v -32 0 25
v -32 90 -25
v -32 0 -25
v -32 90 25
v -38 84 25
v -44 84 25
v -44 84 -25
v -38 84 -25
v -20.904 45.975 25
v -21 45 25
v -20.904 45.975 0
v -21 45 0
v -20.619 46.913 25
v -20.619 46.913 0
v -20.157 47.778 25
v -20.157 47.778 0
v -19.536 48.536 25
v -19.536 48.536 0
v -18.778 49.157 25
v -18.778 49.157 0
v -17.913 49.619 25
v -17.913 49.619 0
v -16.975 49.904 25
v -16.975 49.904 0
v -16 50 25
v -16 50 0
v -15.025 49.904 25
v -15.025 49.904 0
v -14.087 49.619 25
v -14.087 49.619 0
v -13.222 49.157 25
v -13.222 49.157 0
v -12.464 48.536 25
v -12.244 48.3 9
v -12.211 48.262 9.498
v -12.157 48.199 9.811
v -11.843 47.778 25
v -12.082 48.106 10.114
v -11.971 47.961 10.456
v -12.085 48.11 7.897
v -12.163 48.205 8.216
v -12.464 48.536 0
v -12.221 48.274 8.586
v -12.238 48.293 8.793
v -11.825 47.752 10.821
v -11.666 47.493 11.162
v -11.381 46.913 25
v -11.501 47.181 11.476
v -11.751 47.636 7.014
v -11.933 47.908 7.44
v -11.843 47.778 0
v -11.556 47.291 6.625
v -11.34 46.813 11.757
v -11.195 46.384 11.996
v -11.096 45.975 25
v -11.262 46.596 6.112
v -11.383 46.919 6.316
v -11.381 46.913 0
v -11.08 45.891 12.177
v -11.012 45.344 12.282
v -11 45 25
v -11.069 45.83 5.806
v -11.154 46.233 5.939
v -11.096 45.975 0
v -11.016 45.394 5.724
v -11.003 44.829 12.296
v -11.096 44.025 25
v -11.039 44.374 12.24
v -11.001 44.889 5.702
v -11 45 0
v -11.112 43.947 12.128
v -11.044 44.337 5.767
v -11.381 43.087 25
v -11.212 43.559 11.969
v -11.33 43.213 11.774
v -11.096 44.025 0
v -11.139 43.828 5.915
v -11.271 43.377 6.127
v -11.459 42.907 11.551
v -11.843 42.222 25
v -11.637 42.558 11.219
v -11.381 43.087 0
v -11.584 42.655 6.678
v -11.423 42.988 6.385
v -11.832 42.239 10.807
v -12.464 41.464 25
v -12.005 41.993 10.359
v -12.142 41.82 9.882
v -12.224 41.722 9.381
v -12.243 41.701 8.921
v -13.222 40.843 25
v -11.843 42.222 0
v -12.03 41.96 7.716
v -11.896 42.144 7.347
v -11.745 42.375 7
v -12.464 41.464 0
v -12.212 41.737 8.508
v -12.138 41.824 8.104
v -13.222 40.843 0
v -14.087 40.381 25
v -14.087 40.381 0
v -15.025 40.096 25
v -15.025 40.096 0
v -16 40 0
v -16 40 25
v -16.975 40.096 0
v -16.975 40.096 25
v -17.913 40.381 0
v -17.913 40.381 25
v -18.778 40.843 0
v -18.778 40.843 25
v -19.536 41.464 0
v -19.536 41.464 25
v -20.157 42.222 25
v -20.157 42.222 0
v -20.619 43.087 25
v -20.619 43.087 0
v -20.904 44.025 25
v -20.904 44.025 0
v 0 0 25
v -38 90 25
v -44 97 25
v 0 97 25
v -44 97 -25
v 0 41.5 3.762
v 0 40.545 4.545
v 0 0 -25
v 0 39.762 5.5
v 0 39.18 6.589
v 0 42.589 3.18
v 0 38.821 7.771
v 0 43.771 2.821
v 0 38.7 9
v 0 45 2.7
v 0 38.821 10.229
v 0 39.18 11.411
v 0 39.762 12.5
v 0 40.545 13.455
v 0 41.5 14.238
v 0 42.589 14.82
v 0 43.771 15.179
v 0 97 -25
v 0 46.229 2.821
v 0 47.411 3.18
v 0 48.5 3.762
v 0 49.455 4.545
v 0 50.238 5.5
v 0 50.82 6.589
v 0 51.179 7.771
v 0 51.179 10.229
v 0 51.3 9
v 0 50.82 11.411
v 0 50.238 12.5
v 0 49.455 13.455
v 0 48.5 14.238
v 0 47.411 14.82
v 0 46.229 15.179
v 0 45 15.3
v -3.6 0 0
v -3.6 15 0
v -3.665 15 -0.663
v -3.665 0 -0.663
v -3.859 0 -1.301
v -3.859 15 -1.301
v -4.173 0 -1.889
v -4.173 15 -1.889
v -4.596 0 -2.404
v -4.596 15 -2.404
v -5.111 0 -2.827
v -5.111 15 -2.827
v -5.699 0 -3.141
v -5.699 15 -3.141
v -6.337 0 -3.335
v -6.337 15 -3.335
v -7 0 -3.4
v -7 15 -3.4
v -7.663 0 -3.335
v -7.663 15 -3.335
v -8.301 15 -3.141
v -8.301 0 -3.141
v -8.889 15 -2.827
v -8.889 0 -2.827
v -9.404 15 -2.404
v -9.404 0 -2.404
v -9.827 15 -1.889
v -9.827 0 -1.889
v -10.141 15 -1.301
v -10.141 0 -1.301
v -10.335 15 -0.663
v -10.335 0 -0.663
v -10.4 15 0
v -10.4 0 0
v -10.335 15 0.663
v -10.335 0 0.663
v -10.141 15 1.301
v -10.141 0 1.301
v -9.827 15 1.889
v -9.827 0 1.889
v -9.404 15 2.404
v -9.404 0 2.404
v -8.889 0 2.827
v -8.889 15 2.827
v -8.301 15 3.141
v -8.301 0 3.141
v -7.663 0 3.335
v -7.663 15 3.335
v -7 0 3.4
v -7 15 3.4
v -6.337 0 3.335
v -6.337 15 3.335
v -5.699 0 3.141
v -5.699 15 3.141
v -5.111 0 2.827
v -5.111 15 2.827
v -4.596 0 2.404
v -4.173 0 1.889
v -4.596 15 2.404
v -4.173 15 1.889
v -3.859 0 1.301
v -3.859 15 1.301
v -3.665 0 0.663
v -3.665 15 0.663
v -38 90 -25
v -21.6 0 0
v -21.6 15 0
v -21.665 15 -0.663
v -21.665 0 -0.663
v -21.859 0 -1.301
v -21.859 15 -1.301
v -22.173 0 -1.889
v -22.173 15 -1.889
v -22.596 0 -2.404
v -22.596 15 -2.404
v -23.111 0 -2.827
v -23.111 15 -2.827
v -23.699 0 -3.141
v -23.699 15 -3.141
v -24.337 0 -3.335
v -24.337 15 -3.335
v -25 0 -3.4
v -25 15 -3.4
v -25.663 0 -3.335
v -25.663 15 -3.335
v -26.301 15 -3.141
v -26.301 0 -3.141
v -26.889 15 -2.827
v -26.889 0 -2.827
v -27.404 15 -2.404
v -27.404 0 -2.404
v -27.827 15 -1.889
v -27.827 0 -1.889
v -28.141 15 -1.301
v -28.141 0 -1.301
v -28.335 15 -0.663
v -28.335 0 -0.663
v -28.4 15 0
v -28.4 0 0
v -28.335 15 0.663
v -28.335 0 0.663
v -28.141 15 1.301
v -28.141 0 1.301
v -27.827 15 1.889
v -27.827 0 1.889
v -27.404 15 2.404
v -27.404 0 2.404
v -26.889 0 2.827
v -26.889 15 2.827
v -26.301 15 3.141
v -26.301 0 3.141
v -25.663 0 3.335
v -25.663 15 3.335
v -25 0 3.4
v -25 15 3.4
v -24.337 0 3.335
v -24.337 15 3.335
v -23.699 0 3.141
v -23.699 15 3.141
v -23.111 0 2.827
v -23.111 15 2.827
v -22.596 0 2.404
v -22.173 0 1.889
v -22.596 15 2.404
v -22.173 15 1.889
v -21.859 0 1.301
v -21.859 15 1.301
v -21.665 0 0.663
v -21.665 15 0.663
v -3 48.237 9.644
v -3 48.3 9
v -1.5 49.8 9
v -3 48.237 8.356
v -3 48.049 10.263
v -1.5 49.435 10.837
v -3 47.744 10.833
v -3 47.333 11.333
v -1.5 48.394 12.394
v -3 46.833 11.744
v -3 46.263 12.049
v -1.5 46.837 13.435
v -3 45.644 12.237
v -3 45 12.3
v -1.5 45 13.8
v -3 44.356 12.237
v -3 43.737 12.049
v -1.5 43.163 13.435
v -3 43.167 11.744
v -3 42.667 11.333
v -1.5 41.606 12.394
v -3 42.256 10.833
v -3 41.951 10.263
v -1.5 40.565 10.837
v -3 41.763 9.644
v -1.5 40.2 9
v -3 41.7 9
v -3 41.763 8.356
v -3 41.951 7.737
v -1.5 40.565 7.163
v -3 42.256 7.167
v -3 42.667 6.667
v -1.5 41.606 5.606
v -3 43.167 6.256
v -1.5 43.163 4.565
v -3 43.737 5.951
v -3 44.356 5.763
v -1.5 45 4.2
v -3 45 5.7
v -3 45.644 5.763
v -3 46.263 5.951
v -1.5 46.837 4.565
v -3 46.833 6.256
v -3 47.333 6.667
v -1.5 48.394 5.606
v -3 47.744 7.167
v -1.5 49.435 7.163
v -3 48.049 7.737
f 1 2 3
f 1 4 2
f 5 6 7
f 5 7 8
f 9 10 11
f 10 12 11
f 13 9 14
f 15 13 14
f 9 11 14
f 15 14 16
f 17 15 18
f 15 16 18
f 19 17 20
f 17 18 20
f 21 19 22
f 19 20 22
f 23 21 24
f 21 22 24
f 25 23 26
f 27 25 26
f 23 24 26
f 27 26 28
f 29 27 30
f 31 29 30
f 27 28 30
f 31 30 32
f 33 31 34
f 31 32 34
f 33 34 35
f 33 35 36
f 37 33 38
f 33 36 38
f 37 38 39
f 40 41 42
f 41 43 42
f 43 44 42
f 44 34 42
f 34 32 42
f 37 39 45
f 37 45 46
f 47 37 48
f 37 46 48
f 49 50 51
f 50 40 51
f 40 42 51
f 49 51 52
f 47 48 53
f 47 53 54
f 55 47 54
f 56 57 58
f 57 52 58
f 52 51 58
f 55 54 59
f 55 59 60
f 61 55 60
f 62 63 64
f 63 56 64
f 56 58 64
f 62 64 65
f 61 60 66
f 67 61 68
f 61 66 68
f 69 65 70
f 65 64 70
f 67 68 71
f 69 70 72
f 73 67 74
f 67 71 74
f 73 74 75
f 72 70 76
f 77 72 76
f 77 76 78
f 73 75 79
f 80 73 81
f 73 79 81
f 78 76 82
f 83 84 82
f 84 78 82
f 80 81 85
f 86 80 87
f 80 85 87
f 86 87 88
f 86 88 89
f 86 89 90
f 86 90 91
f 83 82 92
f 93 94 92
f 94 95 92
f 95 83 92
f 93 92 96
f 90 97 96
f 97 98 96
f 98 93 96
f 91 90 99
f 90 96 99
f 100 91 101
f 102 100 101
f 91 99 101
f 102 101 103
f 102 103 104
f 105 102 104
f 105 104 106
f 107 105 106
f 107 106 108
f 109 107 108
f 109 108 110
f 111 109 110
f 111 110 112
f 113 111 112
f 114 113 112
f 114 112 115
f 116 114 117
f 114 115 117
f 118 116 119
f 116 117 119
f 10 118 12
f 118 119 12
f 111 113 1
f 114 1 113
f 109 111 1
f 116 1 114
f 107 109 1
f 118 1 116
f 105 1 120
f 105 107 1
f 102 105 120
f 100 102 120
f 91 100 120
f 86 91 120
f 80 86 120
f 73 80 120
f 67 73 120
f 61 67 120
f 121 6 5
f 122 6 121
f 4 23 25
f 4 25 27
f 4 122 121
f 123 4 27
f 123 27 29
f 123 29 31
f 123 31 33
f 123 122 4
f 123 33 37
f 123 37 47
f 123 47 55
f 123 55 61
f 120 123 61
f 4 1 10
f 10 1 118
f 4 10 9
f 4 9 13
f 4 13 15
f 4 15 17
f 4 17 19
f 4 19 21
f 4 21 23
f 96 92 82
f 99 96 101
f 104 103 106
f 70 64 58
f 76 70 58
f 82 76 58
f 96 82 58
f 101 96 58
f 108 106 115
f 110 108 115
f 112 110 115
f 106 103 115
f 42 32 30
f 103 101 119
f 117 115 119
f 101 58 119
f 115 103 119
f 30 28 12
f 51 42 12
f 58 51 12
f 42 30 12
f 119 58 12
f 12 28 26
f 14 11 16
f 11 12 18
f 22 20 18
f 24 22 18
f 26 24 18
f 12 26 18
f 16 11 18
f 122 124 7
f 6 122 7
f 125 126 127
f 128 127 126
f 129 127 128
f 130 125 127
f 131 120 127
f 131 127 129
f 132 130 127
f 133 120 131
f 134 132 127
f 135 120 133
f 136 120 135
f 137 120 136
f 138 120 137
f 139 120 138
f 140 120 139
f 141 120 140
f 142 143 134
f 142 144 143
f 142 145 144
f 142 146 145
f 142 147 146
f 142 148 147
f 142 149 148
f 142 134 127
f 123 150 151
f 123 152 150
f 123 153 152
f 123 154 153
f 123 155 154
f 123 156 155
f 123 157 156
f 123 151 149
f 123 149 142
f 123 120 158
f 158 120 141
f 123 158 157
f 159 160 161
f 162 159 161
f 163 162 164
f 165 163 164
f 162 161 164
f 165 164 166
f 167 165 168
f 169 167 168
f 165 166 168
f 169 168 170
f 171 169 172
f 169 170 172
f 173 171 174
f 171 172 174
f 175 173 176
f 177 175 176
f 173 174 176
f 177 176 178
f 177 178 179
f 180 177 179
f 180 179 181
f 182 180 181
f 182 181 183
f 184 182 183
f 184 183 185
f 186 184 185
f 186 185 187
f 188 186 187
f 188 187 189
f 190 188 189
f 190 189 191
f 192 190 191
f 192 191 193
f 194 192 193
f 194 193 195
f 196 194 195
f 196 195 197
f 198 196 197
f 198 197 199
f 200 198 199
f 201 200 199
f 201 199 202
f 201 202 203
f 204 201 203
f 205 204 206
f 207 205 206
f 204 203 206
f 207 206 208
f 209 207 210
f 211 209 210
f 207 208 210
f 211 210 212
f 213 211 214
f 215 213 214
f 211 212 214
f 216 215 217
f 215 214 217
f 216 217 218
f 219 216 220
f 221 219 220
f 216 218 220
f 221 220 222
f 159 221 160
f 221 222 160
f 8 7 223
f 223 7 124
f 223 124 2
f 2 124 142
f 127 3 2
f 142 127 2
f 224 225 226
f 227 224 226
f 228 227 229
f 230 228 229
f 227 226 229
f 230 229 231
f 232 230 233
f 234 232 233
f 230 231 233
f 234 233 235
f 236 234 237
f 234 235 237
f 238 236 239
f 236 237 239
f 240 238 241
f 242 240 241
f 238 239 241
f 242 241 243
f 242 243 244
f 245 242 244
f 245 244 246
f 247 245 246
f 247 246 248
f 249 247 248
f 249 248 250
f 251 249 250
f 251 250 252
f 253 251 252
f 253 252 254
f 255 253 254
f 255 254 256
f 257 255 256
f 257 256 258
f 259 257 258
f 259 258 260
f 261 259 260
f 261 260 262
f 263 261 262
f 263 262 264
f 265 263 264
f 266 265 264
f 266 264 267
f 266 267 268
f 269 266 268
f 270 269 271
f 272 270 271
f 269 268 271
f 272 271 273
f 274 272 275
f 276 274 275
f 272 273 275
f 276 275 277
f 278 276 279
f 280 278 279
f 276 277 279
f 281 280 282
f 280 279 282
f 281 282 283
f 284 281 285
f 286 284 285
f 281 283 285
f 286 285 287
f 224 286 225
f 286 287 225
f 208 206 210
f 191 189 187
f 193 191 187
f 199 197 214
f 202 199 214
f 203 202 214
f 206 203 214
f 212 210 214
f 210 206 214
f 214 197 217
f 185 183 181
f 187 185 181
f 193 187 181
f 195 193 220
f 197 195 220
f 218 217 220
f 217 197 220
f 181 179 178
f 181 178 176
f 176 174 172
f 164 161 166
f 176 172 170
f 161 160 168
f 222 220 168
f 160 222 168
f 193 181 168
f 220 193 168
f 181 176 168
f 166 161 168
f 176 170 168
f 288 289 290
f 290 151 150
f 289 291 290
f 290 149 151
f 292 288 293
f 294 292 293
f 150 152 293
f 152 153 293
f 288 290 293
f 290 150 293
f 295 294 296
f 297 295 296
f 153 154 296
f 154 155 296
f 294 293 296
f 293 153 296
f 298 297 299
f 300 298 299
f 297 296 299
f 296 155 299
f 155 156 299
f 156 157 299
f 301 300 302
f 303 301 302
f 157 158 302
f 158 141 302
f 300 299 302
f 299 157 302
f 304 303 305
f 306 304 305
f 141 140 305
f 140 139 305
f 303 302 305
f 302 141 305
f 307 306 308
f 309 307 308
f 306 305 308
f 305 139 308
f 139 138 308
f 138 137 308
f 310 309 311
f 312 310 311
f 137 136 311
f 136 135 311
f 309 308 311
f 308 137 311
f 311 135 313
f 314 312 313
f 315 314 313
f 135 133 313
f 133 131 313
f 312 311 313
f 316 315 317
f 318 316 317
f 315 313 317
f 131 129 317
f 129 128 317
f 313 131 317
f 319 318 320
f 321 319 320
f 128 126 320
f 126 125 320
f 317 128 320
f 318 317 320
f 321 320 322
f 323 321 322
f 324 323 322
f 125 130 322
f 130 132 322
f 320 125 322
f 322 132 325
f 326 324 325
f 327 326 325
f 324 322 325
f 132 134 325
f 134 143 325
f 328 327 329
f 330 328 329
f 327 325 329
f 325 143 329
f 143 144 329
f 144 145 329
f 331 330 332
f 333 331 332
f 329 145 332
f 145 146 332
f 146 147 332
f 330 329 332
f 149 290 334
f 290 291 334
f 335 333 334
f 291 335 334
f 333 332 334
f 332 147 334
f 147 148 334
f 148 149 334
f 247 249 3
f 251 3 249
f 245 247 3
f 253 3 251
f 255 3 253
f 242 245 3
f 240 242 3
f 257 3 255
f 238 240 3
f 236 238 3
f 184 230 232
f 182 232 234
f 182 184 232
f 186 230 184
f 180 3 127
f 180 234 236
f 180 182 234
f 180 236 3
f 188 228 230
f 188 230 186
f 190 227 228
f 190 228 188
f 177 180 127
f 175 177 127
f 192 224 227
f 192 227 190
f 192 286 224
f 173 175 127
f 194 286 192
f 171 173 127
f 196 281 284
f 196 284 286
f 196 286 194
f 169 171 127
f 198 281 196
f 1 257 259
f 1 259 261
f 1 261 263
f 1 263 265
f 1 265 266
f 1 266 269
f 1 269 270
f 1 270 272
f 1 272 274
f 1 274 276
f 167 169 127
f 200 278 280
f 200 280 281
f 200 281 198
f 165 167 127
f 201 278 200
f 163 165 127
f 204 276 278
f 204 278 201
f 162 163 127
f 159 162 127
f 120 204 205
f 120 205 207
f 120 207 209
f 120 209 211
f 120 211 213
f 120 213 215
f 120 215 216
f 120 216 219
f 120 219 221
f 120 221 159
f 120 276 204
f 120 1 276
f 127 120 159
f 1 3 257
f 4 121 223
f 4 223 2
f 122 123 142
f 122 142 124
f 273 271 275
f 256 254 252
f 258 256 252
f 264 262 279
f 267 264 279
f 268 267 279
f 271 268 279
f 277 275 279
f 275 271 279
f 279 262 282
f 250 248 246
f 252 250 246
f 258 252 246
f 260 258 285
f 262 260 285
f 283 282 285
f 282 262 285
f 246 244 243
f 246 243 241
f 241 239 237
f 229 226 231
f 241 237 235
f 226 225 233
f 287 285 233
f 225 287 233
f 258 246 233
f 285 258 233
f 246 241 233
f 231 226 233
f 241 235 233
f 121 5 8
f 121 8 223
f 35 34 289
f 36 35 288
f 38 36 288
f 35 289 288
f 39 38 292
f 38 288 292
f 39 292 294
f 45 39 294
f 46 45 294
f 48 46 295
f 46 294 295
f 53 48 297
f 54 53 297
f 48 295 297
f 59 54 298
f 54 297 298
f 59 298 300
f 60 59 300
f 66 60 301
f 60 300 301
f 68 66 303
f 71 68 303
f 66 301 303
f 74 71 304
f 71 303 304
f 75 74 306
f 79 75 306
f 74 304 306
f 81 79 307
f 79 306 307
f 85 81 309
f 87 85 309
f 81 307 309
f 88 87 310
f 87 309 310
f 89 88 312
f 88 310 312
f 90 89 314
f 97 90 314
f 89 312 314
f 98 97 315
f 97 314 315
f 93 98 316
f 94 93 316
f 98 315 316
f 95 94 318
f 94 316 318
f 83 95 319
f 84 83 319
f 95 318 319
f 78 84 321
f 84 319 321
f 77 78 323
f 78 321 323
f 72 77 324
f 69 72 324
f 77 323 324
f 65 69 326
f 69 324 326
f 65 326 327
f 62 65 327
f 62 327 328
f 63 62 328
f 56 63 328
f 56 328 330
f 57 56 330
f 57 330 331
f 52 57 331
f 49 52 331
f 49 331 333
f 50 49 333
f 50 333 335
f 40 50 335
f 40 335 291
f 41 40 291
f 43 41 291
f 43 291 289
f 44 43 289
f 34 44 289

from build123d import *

# Parameters (mm, degrees)
BOSS_EXTRUDE1_DEPTH        = 25
F_10_0MM_DOWEL_HOLE1_D     = 10
F_10_0MM_DOWEL_HOLE1_DEPTH = 25
M8_TAPPED_HOLE1_D          = 6.8
M8_TAPPED_HOLE1_DEPTH      = 15


# Read off the part's stored shape, not the designer's step: CSK for M6 Countersunk Flat Head Screw1
with BuildPart() as part:
    # Sketch1 → Boss-Extrude1 (new, symmetric)
    with BuildSketch(Plane.XY):
        Polygon((0, 0), (0, 97), (-44, 97), (-44, 84), (-38, 84), (-38, 90), (-32, 90), (-32, 0), align=None)
    extrude(amount=BOSS_EXTRUDE1_DEPTH, both=True)

    # Ø10.0mm Dowel Hole1
    with Locations(Plane.XY.offset(25)):
        with Locations((-16, 45)):
            Hole(F_10_0MM_DOWEL_HOLE1_D / 2, depth=F_10_0MM_DOWEL_HOLE1_DEPTH)

    # M8 Tapped Hole1
    with Locations(Plane(origin=(0, 0, 0), x_dir=(-1, 0, 0), z_dir=(0, -1, 0))):
        with Locations((7, 0), (25, 0)):
            Hole(M8_TAPPED_HOLE1_D / 2, depth=M8_TAPPED_HOLE1_DEPTH)

    # CSK for M6 Countersunk Flat Head Scr 2 → CSK for M6 Countersunk Flat Head Screw1 (revolve, cut)
    with BuildSketch(Plane(origin=(0, 45, 9), x_dir=(0, 1, 0), z_dir=(0, 0, -1))):
        Polygon((0, -12.244302381), (3.3, -12.244302381), (3.3, -3), (6.3, 0), (0, 0), align=None)
    revolve(axis=Axis((0, 45, 9), (1, 0, 0)), mode=Mode.SUBTRACT)


solid = part.part
